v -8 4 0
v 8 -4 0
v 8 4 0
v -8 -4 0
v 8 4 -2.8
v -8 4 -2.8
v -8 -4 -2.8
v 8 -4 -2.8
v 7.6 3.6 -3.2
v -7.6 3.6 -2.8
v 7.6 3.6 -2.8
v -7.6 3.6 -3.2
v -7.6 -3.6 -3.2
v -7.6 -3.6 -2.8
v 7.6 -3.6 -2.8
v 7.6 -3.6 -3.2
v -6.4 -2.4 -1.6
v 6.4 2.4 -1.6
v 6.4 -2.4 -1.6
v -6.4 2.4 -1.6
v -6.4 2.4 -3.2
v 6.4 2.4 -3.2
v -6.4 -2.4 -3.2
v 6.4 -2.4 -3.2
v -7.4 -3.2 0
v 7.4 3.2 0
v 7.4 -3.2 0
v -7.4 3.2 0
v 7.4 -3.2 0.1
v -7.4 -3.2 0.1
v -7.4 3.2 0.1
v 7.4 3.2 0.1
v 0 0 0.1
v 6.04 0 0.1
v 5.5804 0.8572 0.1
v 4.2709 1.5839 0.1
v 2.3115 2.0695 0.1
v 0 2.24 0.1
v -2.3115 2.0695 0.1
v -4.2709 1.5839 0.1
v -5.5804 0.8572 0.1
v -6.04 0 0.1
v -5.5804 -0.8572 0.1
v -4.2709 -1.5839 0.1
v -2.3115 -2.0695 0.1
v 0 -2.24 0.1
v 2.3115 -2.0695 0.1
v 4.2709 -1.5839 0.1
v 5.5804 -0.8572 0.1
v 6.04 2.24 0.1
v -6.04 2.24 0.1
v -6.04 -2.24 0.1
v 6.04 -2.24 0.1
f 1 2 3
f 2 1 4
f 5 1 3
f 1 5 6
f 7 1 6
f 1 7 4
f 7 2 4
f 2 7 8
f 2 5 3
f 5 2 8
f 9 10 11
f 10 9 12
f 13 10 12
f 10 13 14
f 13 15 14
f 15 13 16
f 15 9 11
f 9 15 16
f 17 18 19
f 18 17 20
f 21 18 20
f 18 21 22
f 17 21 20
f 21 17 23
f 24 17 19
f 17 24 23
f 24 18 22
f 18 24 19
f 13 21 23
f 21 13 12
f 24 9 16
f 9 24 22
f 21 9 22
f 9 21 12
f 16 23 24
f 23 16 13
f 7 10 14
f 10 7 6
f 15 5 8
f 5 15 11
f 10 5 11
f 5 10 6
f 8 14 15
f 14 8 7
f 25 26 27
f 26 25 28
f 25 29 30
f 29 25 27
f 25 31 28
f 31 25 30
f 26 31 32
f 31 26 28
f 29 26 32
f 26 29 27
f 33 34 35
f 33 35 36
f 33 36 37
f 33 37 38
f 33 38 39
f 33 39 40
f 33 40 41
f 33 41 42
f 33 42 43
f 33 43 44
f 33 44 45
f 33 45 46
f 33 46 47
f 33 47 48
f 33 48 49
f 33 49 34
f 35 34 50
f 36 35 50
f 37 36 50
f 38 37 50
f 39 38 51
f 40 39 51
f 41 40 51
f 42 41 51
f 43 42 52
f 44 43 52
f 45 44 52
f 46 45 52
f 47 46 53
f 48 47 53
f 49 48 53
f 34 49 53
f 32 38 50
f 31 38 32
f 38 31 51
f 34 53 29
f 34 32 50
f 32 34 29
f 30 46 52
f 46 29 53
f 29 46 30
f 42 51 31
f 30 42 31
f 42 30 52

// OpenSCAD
// file: ../p/box5.scad
use <../lib.scad>
function ldraw_lib__box5() = [
// 0 Box with 5 Faces and All Edges
// 0 Name: box5.dat
// 0 Author: James Jessiman
// 0 !LDRAW_ORG Primitive UPDATE 2012-01
// 0 !LICENSE Licensed under CC BY 4.0 : see CAreadme.txt
// 
// 0 BFC CERTIFY CCW
  [0,"BFC","CERTIFY"],
  [0,"BFC","CCW"],
// 
// 0 !HISTORY 2002-04-03 [sbliss] Modified for BFC compliance
// 0 !HISTORY 2002-04-25 [PTadmin] Official Update 2002-02
// 0 !HISTORY 2007-06-24 [PTadmin] Header formatted for Contributor Agreement
// 0 !HISTORY 2008-07-01 [PTadmin] Official Update 2008-01
// 0 !HISTORY 2012-02-16 [Philo] Changed to CCW
// 0 !HISTORY 2012-03-30 [PTadmin] Official Update 2012-01
// 
// 
// 2 24 1 1 1 -1 1 1
  [2,24,1,1,1,-1,1,1],
// 2 24 -1 1 1 -1 1 -1
  [2,24,-1,1,1,-1,1,-1],
// 2 24 -1 1 -1 1 1 -1
  [2,24,-1,1,-1,1,1,-1],
// 2 24 1 1 -1 1 1 1
  [2,24,1,1,-1,1,1,1],
// 2 24 1 0 1 -1 0 1
  [2,24,1,0,1,-1,0,1],
// 2 24 -1 0 1 -1 0 -1
  [2,24,-1,0,1,-1,0,-1],
// 2 24 -1 0 -1 1 0 -1
  [2,24,-1,0,-1,1,0,-1],
// 2 24 1 0 -1 1 0 1
  [2,24,1,0,-1,1,0,1],
// 2 24 1 0 1 1 1 1
  [2,24,1,0,1,1,1,1],
// 2 24 -1 0 1 -1 1 1
  [2,24,-1,0,1,-1,1,1],
// 2 24 1 0 -1 1 1 -1
  [2,24,1,0,-1,1,1,-1],
// 2 24 -1 0 -1 -1 1 -1
  [2,24,-1,0,-1,-1,1,-1],
// 4 16 -1 1 1 1 1 1 1 1 -1 -1 1 -1
  [4,16,-1,1,1,1,1,1,1,1,-1,-1,1,-1],
// 4 16 -1 1 1 -1 0 1 1 0 1 1 1 1
  [4,16,-1,1,1,-1,0,1,1,0,1,1,1,1],
// 4 16 -1 1 -1 -1 0 -1 -1 0 1 -1 1 1
  [4,16,-1,1,-1,-1,0,-1,-1,0,1,-1,1,1],
// 4 16 1 1 -1 1 0 -1 -1 0 -1 -1 1 -1
  [4,16,1,1,-1,1,0,-1,-1,0,-1,-1,1,-1],
// 4 16 1 1 1 1 0 1 1 0 -1 1 1 -1
  [4,16,1,1,1,1,0,1,1,0,-1,1,1,-1],
];
module ldraw_lib__box5(step=0, col=false, unit=2/5, alt=false, line=0.2, solid=!$preview)
    makepoly(ldraw_lib__box5(), step=step, col=col, unit=unit, alt=alt, line=line, solid=solid);
ldraw_lib__box5(line=0.2);
// file: ../p/box4.scad
use <../lib.scad>
function ldraw_lib__box4() = [
// 0 Box with 4 Faces (2 Parallel Pairs) and All Edges
// 0 Name: box4.dat
// 0 Author: James Jessiman
// 0 !LDRAW_ORG Primitive UPDATE 2012-01
// 0 !LICENSE Licensed under CC BY 4.0 : see CAreadme.txt
// 
// 0 BFC CERTIFY CCW
  [0,"BFC","CERTIFY"],
  [0,"BFC","CCW"],
// 
// 0 !HISTORY 2002-04-03 [sbliss] Modified for BFC compliance
// 0 !HISTORY 2002-04-25 [PTadmin] Official Update 2002-02
// 0 !HISTORY 2007-06-24 [PTadmin] Header formatted for Contributor Agreement
// 0 !HISTORY 2008-07-01 [PTadmin] Official Update 2008-01
// 0 !HISTORY 2012-02-16 [Philo] Changed to CCW
// 0 !HISTORY 2012-03-30 [PTadmin] Official Update 2012-01
// 
// 
// 2 24 1 1 1 -1 1 1
  [2,24,1,1,1,-1,1,1],
// 2 24 -1 1 1 -1 1 -1
  [2,24,-1,1,1,-1,1,-1],
// 2 24 -1 1 -1 1 1 -1
  [2,24,-1,1,-1,1,1,-1],
// 2 24 1 1 -1 1 1 1
  [2,24,1,1,-1,1,1,1],
// 2 24 1 0 1 -1 0 1
  [2,24,1,0,1,-1,0,1],
// 2 24 -1 0 1 -1 0 -1
  [2,24,-1,0,1,-1,0,-1],
// 2 24 -1 0 -1 1 0 -1
  [2,24,-1,0,-1,1,0,-1],
// 2 24 1 0 -1 1 0 1
  [2,24,1,0,-1,1,0,1],
// 2 24 1 0 1 1 1 1
  [2,24,1,0,1,1,1,1],
// 2 24 -1 0 1 -1 1 1
  [2,24,-1,0,1,-1,1,1],
// 2 24 1 0 -1 1 1 -1
  [2,24,1,0,-1,1,1,-1],
// 2 24 -1 0 -1 -1 1 -1
  [2,24,-1,0,-1,-1,1,-1],
// 4 16 -1 1 1 -1 0 1 1 0 1 1 1 1
  [4,16,-1,1,1,-1,0,1,1,0,1,1,1,1],
// 4 16 -1 1 -1 -1 0 -1 -1 0 1 -1 1 1
  [4,16,-1,1,-1,-1,0,-1,-1,0,1,-1,1,1],
// 4 16 1 1 -1 1 0 -1 -1 0 -1 -1 1 -1
  [4,16,1,1,-1,1,0,-1,-1,0,-1,-1,1,-1],
// 4 16 1 1 1 1 0 1 1 0 -1 1 1 -1
  [4,16,1,1,1,1,0,1,1,0,-1,1,1,-1],
];
module ldraw_lib__box4(step=0, col=false, unit=2/5, alt=false, line=0.2, solid=!$preview)
    makepoly(ldraw_lib__box4(), step=step, col=col, unit=unit, alt=alt, line=line, solid=solid);
ldraw_lib__box4(line=0.2);
// file: ../p/box5-12.scad
use <../lib.scad>
function ldraw_lib__box5_12() = [
// 0 Box with 5 Faces without Any Edges
// 0 Name: box5-12.dat
// 0 Author: Chris Dee [cwdee]
// 0 !LDRAW_ORG Primitive UPDATE 2009-02
// 0 !LICENSE Licensed under CC BY 4.0 : see CAreadme.txt
// 
// 0 BFC CERTIFY CCW
  [0,"BFC","CERTIFY"],
  [0,"BFC","CCW"],
// 
// 0 !HISTORY 2009-09-03 [PTadmin] Official Update 2009-02
// 
// 
// 4 16 1 1 1 1 1 -1 -1 1 -1 -1 1 1
  [4,16,1,1,1,1,1,-1,-1,1,-1,-1,1,1],
// 4 16 -1 0 1 1 0 1 1 1 1 -1 1 1
  [4,16,-1,0,1,1,0,1,1,1,1,-1,1,1],
// 4 16 -1 0 -1 -1 0 1 -1 1 1 -1 1 -1
  [4,16,-1,0,-1,-1,0,1,-1,1,1,-1,1,-1],
// 4 16 1 0 -1 -1 0 -1 -1 1 -1 1 1 -1
  [4,16,1,0,-1,-1,0,-1,-1,1,-1,1,1,-1],
// 4 16 1 0 1 1 0 -1 1 1 -1 1 1 1
  [4,16,1,0,1,1,0,-1,1,1,-1,1,1,1],
// 0
];
module ldraw_lib__box5_12(step=0, col=false, unit=2/5, alt=false, line=0.2, solid=!$preview)
    makepoly(ldraw_lib__box5_12(), step=step, col=col, unit=unit, alt=alt, line=line, solid=solid);
ldraw_lib__box5_12(line=0.2);
// file: ../p/4-4ndis.scad
use <../lib.scad>
function ldraw_lib__4_4ndis() = [
// 0 Disc Negative 1.0
// 0 Name: 4-4ndis.dat
// 0 Author: James Jessiman
// 0 !LDRAW_ORG Primitive UPDATE 2012-01
// 0 !LICENSE Licensed under CC BY 4.0 : see CAreadme.txt
// 
// 0 BFC CERTIFY CCW
  [0,"BFC","CERTIFY"],
  [0,"BFC","CCW"],
// 
// 0 !HISTORY 2002-03-23 [sbliss] Added BFC statement; compacted code
// 0 !HISTORY 2002-04-25 [PTadmin] Official Update 2002-02
// 0 !HISTORY 2007-06-24 [PTadmin] Header formatted for Contributor Agreement
// 0 !HISTORY 2008-07-01 [PTadmin] Official Update 2008-01
// 0 !HISTORY 2012-02-16 [Philo] Changed to CCW
// 0 !HISTORY 2012-03-30 [PTadmin] Official Update 2012-01
// 
// 
// 3 16 0.9239 0 0.3827 1 0 0 1 0 1
  [3,16,0.9239,0,0.3827,1,0,0,1,0,1],
// 3 16 0.7071 0 0.7071 0.9239 0 0.3827 1 0 1
  [3,16,0.7071,0,0.7071,0.9239,0,0.3827,1,0,1],
// 3 16 0.3827 0 0.9239 0.7071 0 0.7071 1 0 1
  [3,16,0.3827,0,0.9239,0.7071,0,0.7071,1,0,1],
// 3 16 0 0 1 0.3827 0 0.9239 1 0 1
  [3,16,0,0,1,0.3827,0,0.9239,1,0,1],
// 3 16 -0.3827 0 0.9239 0 0 1 -1 0 1
  [3,16,-0.3827,0,0.9239,0,0,1,-1,0,1],
// 3 16 -0.7071 0 0.7071 -0.3827 0 0.9239 -1 0 1
  [3,16,-0.7071,0,0.7071,-0.3827,0,0.9239,-1,0,1],
// 3 16 -0.9239 0 0.3827 -0.7071 0 0.7071 -1 0 1
  [3,16,-0.9239,0,0.3827,-0.7071,0,0.7071,-1,0,1],
// 3 16 -1 0 0 -0.9239 0 0.3827 -1 0 1
  [3,16,-1,0,0,-0.9239,0,0.3827,-1,0,1],
// 3 16 -0.9239 0 -0.3827 -1 0 0 -1 0 -1
  [3,16,-0.9239,0,-0.3827,-1,0,0,-1,0,-1],
// 3 16 -0.7071 0 -0.7071 -0.9239 0 -0.3827 -1 0 -1
  [3,16,-0.7071,0,-0.7071,-0.9239,0,-0.3827,-1,0,-1],
// 3 16 -0.3827 0 -0.9239 -0.7071 0 -0.7071 -1 0 -1
  [3,16,-0.3827,0,-0.9239,-0.7071,0,-0.7071,-1,0,-1],
// 3 16 0 0 -1 -0.3827 0 -0.9239 -1 0 -1
  [3,16,0,0,-1,-0.3827,0,-0.9239,-1,0,-1],
// 3 16 0.3827 0 -0.9239 0 0 -1 1 0 -1
  [3,16,0.3827,0,-0.9239,0,0,-1,1,0,-1],
// 3 16 0.7071 0 -0.7071 0.3827 0 -0.9239 1 0 -1
  [3,16,0.7071,0,-0.7071,0.3827,0,-0.9239,1,0,-1],
// 3 16 0.9239 0 -0.3827 0.7071 0 -0.7071 1 0 -1
  [3,16,0.9239,0,-0.3827,0.7071,0,-0.7071,1,0,-1],
// 3 16 1 0 0 0.9239 0 -0.3827 1 0 -1
  [3,16,1,0,0,0.9239,0,-0.3827,1,0,-1],
];
module ldraw_lib__4_4ndis(step=0, col=false, unit=2/5, alt=false, line=0.2, solid=!$preview)
    makepoly(ldraw_lib__4_4ndis(), step=step, col=col, unit=unit, alt=alt, line=line, solid=solid);
ldraw_lib__4_4ndis(line=0.2);
// file: ../p/4-4disc.scad
use <../lib.scad>
function ldraw_lib__4_4disc() = [
// 0 Disc 1.0
// 0 Name: 4-4disc.dat
// 0 Author: James Jessiman
// 0 !LDRAW_ORG Primitive UPDATE 2002-02
// 0 !LICENSE Licensed under CC BY 4.0 : see CAreadme.txt
// 
// 0 BFC CERTIFY CCW
  [0,"BFC","CERTIFY"],
  [0,"BFC","CCW"],
// 
// 0 !HISTORY 1998-12-15 [PTadmin] Official Update 1998-10
// 0 !HISTORY 2002-03-23 [sbliss] Added BFC statement
// 0 !HISTORY 2002-04-25 [PTadmin] Official Update 2002-02
// 0 !HISTORY 2007-06-24 [PTadmin] Header formatted for Contributor Agreement
// 0 !HISTORY 2008-07-01 [PTadmin] Official Update 2008-01
// 
// 
// 3 16 0 0 0 1 0 0 0.9239 0 0.3827
  [3,16,0,0,0,1,0,0,0.9239,0,0.3827],
// 3 16 0 0 0 0.9239 0 0.3827 0.7071 0 0.7071
  [3,16,0,0,0,0.9239,0,0.3827,0.7071,0,0.7071],
// 3 16 0 0 0 0.7071 0 0.7071 0.3827 0 0.9239
  [3,16,0,0,0,0.7071,0,0.7071,0.3827,0,0.9239],
// 3 16 0 0 0 0.3827 0 0.9239 0 0 1
  [3,16,0,0,0,0.3827,0,0.9239,0,0,1],
// 3 16 0 0 0 0 0 1 -0.3827 0 0.9239
  [3,16,0,0,0,0,0,1,-0.3827,0,0.9239],
// 3 16 0 0 0 -0.3827 0 0.9239 -0.7071 0 0.7071
  [3,16,0,0,0,-0.3827,0,0.9239,-0.7071,0,0.7071],
// 3 16 0 0 0 -0.7071 0 0.7071 -0.9239 0 0.3827
  [3,16,0,0,0,-0.7071,0,0.7071,-0.9239,0,0.3827],
// 3 16 0 0 0 -0.9239 0 0.3827 -1 0 -0
  [3,16,0,0,0,-0.9239,0,0.3827,-1,0,-0],
// 3 16 0 0 0 -1 0 -0 -0.9239 0 -0.3827
  [3,16,0,0,0,-1,0,-0,-0.9239,0,-0.3827],
// 3 16 0 0 0 -0.9239 0 -0.3827 -0.7071 0 -0.7071
  [3,16,0,0,0,-0.9239,0,-0.3827,-0.7071,0,-0.7071],
// 3 16 0 0 0 -0.7071 0 -0.7071 -0.3827 0 -0.9239
  [3,16,0,0,0,-0.7071,0,-0.7071,-0.3827,0,-0.9239],
// 3 16 0 0 0 -0.3827 0 -0.9239 0 0 -1
  [3,16,0,0,0,-0.3827,0,-0.9239,0,0,-1],
// 3 16 0 0 0 0 0 -1 0.3827 0 -0.9239
  [3,16,0,0,0,0,0,-1,0.3827,0,-0.9239],
// 3 16 0 0 0 0.3827 0 -0.9239 0.7071 0 -0.7071
  [3,16,0,0,0,0.3827,0,-0.9239,0.7071,0,-0.7071],
// 3 16 0 0 0 0.7071 0 -0.7071 0.9239 0 -0.3827
  [3,16,0,0,0,0.7071,0,-0.7071,0.9239,0,-0.3827],
// 3 16 0 0 0 0.9239 0 -0.3827 1 0 0
  [3,16,0,0,0,0.9239,0,-0.3827,1,0,0],
// 0
];
module ldraw_lib__4_4disc(step=0, col=false, unit=2/5, alt=false, line=0.2, solid=!$preview)
    makepoly(ldraw_lib__4_4disc(), step=step, col=col, unit=unit, alt=alt, line=line, solid=solid);
ldraw_lib__4_4disc(line=0.2);
// file: s/3069bs01.scad
use <../../lib.scad>
use <../../p/box4.scad>
use <../../p/box5.scad>
function ldraw_lib__s__3069bs01() = [
// 0 ~Tile  1 x  2 with Groove without Top Face
// 0 Name: s\3069bs01.dat
// 0 Author: Santeri Piippo [arezey]
// 0 !LDRAW_ORG Subpart UPDATE 2010-02
// 0 !LICENSE Licensed under CC BY 4.0 : see CAreadme.txt
// 
// 0 BFC CERTIFY CCW
  [0,"BFC","CERTIFY"],
  [0,"BFC","CCW"],
// 
// 0 !HISTORY 2010-07-05 [PTadmin] Official Update 2010-02
// 
// 
// 1 16 0 0 0 20 0 0 0 7 0 0 0 10 box4.dat
  [1,16,0,0,0,20,0,0,0,7,0,0,0,10, ldraw_lib__box4()],
// 1 16 0 7 0 19 0 0 0 1 0 0 0 9 box4.dat
  [1,16,0,7,0,19,0,0,0,1,0,0,0,9, ldraw_lib__box4()],
// 0 BFC INVERTNEXT
  [0,"BFC","INVERTNEXT"],
// 1 16 0 8 0 16 0 0 0 -4 0 0 0 6 box5.dat
  [1,16,0,8,0,16,0,0,0,-4,0,0,0,6, ldraw_lib__box5()],
// 4 16 -19 8 9 -16 8 6 -16 8 -6 -19 8 -9
  [4,16,-19,8,9,-16,8,6,-16,8,-6,-19,8,-9],
// 4 16 19 8 -9 16 8 -6 16 8 6 19 8 9
  [4,16,19,8,-9,16,8,-6,16,8,6,19,8,9],
// 4 16 19 8 9 16 8 6 -16 8 6 -19 8 9
  [4,16,19,8,9,16,8,6,-16,8,6,-19,8,9],
// 4 16 -19 8 -9 -16 8 -6 16 8 -6 19 8 -9
  [4,16,-19,8,-9,-16,8,-6,16,8,-6,19,8,-9],
// 4 16 -20 7 10 -19 7 9 -19 7 -9 -20 7 -10
  [4,16,-20,7,10,-19,7,9,-19,7,-9,-20,7,-10],
// 4 16 20 7 -10 19 7 -9 19 7 9 20 7 10
  [4,16,20,7,-10,19,7,-9,19,7,9,20,7,10],
// 4 16 20 7 10 19 7 9 -19 7 9 -20 7 10
  [4,16,20,7,10,19,7,9,-19,7,9,-20,7,10],
// 4 16 -20 7 -10 -19 7 -9 19 7 -9 20 7 -10
  [4,16,-20,7,-10,-19,7,-9,19,7,-9,20,7,-10],
// 0 //
];
module ldraw_lib__s__3069bs01(step=0, col=false, unit=2/5, alt=false, line=0.2, solid=!$preview)
    makepoly(ldraw_lib__s__3069bs01(), step=step, col=col, unit=unit, alt=alt, line=line, solid=solid);
ldraw_lib__s__3069bs01(line=0.2);
// file: 821420a.scad
use <../lib.scad>
use <../p/4-4disc.scad>
use <../p/4-4ndis.scad>
use <../p/box5-12.scad>
function ldraw_lib__821420a() = [
// 0 Sticker  0.8 x  1.85 with Black Oval
// 0 Name: 821420a.dat
// 0 Author: Max Martin Richter [MMR1988]
// 0 !LDRAW_ORG Part UPDATE 2013-02
// 0 !LICENSE Licensed under CC BY 4.0 : see CAreadme.txt
// 
// 0 BFC CERTIFY CCW
  [0,"BFC","CERTIFY"],
  [0,"BFC","CCW"],
// 
// 0 !KEYWORDS basin, set 10002, set 4547, sink
// 
// 0 !HISTORY 2013-12-23 [PTadmin] Official Update 2013-02
// 
// 
// 1 16 0 -0.25 0 18.5 0 0 0 0.25 0 0 0 -8 box5-12.dat
  [1,16,0,-0.25,0,18.5,0,0,0,0.25,0,0,0,-8, ldraw_lib__box5_12()],
// 
// 1 0 0 -0.25 0 15.1 0 0 0 1 0 0 0 5.6 4-4disc.dat
  [1,0,0,-0.25,0,15.1,0,0,0,1,0,0,0,5.6, ldraw_lib__4_4disc()],
// 1 16 0 -0.25 0 15.1 0 0 0 1 0 0 0 5.6 4-4ndis.dat
  [1,16,0,-0.25,0,15.1,0,0,0,1,0,0,0,5.6, ldraw_lib__4_4ndis()],
// 
// 3 16 18.5 -0.25 8 0 -0.25 5.6 15.1 -0.25 5.6
  [3,16,18.5,-0.25,8,0,-0.25,5.6,15.1,-0.25,5.6],
// 4 16 18.5 -0.25 8 -18.5 -0.25 8 -15.1 -0.25 5.6 0 -0.25 5.6
  [4,16,18.5,-0.25,8,-18.5,-0.25,8,-15.1,-0.25,5.6,0,-0.25,5.6],
// 3 16 15.1 -0.25 0 15.1 -0.25 -5.6 18.5 -0.25 -8
  [3,16,15.1,-0.25,0,15.1,-0.25,-5.6,18.5,-0.25,-8],
// 4 16 15.1 -0.25 5.6 15.1 -0.25 0 18.5 -0.25 -8 18.5 -0.25 8
  [4,16,15.1,-0.25,5.6,15.1,-0.25,0,18.5,-0.25,-8,18.5,-0.25,8],
// 3 16 -18.5 -0.25 -8 0 -0.25 -5.6 -15.1 -0.25 -5.6
  [3,16,-18.5,-0.25,-8,0,-0.25,-5.6,-15.1,-0.25,-5.6],
// 4 16 -18.5 -0.25 -8 18.5 -0.25 -8 15.1 -0.25 -5.6 0 -0.25 -5.6
  [4,16,-18.5,-0.25,-8,18.5,-0.25,-8,15.1,-0.25,-5.6,0,-0.25,-5.6],
// 3 16 -15.1 -0.25 0 -15.1 -0.25 5.6 -18.5 -0.25 8
  [3,16,-15.1,-0.25,0,-15.1,-0.25,5.6,-18.5,-0.25,8],
// 4 16 -15.1 -0.25 -5.6 -15.1 -0.25 0 -18.5 -0.25 8 -18.5 -0.25 -8
  [4,16,-15.1,-0.25,-5.6,-15.1,-0.25,0,-18.5,-0.25,8,-18.5,-0.25,-8],
];
module ldraw_lib__821420a(step=0, col=false, unit=2/5, alt=false, line=0.2, solid=!$preview)
    makepoly(ldraw_lib__821420a(), step=step, col=col, unit=unit, alt=alt, line=line, solid=solid);
ldraw_lib__821420a(line=0.2);
// file: 3069b.scad
use <../lib.scad>
use <s/3069bs01.scad>
function ldraw_lib__3069b() = [
// 0 Tile  1 x  2 with Groove
// 0 Name: 3069b.dat
// 0 Author: Santeri Piippo [arezey]
// 0 !LDRAW_ORG Part UPDATE 2010-02
// 0 !LICENSE Licensed under CC BY 4.0 : see CAreadme.txt
// 
// 0 BFC CERTIFY CCW
  [0,"BFC","CERTIFY"],
  [0,"BFC","CCW"],
// 
// 0 !KEYWORDS BrickLink 3069
// 
// 0 !HISTORY 2010-07-05 [PTadmin] Official Update 2010-02
// 
// 
// 4 16 20 0 -10 20 0 10 -20 0 10 -20 0 -10
  [4,16,20,0,-10,20,0,10,-20,0,10,-20,0,-10],
// 1 16 0 0 0 1 0 0 0 1 0 0 0 1 s\3069bs01.dat
  [1,16,0,0,0,1,0,0,0,1,0,0,0,1, ldraw_lib__s__3069bs01()],
// 0 //
];
module ldraw_lib__3069b(step=0, col=false, unit=2/5, alt=false, line=0.2, solid=!$preview)
    makepoly(ldraw_lib__3069b(), step=step, col=col, unit=unit, alt=alt, line=line, solid=solid);
ldraw_lib__3069b(line=0.2);
// main file
use <../lib.scad>
use <3069b.scad>
use <821420a.scad>
function ldraw_lib__3069bd01() = [
// 0 Tile  1 x  2 with Groove with Black Oval Sticker
// 0 Name: 3069bd01.dat
// 0 Author: Steffen [Steffen]
// 0 !LDRAW_ORG Shortcut UPDATE 2026-05
// 0 !LICENSE Licensed under CC BY 4.0 : see CAreadme.txt
// 
// 0 BFC CERTIFY CCW
  [0,"BFC","CERTIFY"],
  [0,"BFC","CCW"],
// 
// 0 !CATEGORY Sticker Shortcut
// 
// 0 !KEYWORDS basin, set 10002, set 4547, sink
// 
// 0 !HISTORY 2014-06-21 [PTadmin] Official Update 2014-01
// 0 !HISTORY 2024-05-27 [OrionP] Change category to Sticker Shortcut
// 0 !HISTORY 2024-05-28 [OrionP] Official Update 2024-04
// 0 !HISTORY 2026-04-28 [Sirio] Changed description: moved "Sticker" to end
// 0 !HISTORY 2026-05-31 [OrionP] Official Update 2026-05
// 
// 1 16 0 0 0 1 0 0 0 1 0 0 0 1 3069b.dat
  [1,16,0,0,0,1,0,0,0,1,0,0,0,1, ldraw_lib__3069b()],
// 1 16 0 0 0 1 0 0 0 1 0 0 0 1 821420a.dat
  [1,16,0,0,0,1,0,0,0,1,0,0,0,1, ldraw_lib__821420a()],
];
module ldraw_lib__3069bd01(step=0, col=false, unit=2/5, alt=false, line=0.2, solid=!$preview)
    makepoly(ldraw_lib__3069bd01(), step=step, col=col, unit=unit, alt=alt, line=line, solid=solid);
ldraw_lib__3069bd01(line=0.2);
